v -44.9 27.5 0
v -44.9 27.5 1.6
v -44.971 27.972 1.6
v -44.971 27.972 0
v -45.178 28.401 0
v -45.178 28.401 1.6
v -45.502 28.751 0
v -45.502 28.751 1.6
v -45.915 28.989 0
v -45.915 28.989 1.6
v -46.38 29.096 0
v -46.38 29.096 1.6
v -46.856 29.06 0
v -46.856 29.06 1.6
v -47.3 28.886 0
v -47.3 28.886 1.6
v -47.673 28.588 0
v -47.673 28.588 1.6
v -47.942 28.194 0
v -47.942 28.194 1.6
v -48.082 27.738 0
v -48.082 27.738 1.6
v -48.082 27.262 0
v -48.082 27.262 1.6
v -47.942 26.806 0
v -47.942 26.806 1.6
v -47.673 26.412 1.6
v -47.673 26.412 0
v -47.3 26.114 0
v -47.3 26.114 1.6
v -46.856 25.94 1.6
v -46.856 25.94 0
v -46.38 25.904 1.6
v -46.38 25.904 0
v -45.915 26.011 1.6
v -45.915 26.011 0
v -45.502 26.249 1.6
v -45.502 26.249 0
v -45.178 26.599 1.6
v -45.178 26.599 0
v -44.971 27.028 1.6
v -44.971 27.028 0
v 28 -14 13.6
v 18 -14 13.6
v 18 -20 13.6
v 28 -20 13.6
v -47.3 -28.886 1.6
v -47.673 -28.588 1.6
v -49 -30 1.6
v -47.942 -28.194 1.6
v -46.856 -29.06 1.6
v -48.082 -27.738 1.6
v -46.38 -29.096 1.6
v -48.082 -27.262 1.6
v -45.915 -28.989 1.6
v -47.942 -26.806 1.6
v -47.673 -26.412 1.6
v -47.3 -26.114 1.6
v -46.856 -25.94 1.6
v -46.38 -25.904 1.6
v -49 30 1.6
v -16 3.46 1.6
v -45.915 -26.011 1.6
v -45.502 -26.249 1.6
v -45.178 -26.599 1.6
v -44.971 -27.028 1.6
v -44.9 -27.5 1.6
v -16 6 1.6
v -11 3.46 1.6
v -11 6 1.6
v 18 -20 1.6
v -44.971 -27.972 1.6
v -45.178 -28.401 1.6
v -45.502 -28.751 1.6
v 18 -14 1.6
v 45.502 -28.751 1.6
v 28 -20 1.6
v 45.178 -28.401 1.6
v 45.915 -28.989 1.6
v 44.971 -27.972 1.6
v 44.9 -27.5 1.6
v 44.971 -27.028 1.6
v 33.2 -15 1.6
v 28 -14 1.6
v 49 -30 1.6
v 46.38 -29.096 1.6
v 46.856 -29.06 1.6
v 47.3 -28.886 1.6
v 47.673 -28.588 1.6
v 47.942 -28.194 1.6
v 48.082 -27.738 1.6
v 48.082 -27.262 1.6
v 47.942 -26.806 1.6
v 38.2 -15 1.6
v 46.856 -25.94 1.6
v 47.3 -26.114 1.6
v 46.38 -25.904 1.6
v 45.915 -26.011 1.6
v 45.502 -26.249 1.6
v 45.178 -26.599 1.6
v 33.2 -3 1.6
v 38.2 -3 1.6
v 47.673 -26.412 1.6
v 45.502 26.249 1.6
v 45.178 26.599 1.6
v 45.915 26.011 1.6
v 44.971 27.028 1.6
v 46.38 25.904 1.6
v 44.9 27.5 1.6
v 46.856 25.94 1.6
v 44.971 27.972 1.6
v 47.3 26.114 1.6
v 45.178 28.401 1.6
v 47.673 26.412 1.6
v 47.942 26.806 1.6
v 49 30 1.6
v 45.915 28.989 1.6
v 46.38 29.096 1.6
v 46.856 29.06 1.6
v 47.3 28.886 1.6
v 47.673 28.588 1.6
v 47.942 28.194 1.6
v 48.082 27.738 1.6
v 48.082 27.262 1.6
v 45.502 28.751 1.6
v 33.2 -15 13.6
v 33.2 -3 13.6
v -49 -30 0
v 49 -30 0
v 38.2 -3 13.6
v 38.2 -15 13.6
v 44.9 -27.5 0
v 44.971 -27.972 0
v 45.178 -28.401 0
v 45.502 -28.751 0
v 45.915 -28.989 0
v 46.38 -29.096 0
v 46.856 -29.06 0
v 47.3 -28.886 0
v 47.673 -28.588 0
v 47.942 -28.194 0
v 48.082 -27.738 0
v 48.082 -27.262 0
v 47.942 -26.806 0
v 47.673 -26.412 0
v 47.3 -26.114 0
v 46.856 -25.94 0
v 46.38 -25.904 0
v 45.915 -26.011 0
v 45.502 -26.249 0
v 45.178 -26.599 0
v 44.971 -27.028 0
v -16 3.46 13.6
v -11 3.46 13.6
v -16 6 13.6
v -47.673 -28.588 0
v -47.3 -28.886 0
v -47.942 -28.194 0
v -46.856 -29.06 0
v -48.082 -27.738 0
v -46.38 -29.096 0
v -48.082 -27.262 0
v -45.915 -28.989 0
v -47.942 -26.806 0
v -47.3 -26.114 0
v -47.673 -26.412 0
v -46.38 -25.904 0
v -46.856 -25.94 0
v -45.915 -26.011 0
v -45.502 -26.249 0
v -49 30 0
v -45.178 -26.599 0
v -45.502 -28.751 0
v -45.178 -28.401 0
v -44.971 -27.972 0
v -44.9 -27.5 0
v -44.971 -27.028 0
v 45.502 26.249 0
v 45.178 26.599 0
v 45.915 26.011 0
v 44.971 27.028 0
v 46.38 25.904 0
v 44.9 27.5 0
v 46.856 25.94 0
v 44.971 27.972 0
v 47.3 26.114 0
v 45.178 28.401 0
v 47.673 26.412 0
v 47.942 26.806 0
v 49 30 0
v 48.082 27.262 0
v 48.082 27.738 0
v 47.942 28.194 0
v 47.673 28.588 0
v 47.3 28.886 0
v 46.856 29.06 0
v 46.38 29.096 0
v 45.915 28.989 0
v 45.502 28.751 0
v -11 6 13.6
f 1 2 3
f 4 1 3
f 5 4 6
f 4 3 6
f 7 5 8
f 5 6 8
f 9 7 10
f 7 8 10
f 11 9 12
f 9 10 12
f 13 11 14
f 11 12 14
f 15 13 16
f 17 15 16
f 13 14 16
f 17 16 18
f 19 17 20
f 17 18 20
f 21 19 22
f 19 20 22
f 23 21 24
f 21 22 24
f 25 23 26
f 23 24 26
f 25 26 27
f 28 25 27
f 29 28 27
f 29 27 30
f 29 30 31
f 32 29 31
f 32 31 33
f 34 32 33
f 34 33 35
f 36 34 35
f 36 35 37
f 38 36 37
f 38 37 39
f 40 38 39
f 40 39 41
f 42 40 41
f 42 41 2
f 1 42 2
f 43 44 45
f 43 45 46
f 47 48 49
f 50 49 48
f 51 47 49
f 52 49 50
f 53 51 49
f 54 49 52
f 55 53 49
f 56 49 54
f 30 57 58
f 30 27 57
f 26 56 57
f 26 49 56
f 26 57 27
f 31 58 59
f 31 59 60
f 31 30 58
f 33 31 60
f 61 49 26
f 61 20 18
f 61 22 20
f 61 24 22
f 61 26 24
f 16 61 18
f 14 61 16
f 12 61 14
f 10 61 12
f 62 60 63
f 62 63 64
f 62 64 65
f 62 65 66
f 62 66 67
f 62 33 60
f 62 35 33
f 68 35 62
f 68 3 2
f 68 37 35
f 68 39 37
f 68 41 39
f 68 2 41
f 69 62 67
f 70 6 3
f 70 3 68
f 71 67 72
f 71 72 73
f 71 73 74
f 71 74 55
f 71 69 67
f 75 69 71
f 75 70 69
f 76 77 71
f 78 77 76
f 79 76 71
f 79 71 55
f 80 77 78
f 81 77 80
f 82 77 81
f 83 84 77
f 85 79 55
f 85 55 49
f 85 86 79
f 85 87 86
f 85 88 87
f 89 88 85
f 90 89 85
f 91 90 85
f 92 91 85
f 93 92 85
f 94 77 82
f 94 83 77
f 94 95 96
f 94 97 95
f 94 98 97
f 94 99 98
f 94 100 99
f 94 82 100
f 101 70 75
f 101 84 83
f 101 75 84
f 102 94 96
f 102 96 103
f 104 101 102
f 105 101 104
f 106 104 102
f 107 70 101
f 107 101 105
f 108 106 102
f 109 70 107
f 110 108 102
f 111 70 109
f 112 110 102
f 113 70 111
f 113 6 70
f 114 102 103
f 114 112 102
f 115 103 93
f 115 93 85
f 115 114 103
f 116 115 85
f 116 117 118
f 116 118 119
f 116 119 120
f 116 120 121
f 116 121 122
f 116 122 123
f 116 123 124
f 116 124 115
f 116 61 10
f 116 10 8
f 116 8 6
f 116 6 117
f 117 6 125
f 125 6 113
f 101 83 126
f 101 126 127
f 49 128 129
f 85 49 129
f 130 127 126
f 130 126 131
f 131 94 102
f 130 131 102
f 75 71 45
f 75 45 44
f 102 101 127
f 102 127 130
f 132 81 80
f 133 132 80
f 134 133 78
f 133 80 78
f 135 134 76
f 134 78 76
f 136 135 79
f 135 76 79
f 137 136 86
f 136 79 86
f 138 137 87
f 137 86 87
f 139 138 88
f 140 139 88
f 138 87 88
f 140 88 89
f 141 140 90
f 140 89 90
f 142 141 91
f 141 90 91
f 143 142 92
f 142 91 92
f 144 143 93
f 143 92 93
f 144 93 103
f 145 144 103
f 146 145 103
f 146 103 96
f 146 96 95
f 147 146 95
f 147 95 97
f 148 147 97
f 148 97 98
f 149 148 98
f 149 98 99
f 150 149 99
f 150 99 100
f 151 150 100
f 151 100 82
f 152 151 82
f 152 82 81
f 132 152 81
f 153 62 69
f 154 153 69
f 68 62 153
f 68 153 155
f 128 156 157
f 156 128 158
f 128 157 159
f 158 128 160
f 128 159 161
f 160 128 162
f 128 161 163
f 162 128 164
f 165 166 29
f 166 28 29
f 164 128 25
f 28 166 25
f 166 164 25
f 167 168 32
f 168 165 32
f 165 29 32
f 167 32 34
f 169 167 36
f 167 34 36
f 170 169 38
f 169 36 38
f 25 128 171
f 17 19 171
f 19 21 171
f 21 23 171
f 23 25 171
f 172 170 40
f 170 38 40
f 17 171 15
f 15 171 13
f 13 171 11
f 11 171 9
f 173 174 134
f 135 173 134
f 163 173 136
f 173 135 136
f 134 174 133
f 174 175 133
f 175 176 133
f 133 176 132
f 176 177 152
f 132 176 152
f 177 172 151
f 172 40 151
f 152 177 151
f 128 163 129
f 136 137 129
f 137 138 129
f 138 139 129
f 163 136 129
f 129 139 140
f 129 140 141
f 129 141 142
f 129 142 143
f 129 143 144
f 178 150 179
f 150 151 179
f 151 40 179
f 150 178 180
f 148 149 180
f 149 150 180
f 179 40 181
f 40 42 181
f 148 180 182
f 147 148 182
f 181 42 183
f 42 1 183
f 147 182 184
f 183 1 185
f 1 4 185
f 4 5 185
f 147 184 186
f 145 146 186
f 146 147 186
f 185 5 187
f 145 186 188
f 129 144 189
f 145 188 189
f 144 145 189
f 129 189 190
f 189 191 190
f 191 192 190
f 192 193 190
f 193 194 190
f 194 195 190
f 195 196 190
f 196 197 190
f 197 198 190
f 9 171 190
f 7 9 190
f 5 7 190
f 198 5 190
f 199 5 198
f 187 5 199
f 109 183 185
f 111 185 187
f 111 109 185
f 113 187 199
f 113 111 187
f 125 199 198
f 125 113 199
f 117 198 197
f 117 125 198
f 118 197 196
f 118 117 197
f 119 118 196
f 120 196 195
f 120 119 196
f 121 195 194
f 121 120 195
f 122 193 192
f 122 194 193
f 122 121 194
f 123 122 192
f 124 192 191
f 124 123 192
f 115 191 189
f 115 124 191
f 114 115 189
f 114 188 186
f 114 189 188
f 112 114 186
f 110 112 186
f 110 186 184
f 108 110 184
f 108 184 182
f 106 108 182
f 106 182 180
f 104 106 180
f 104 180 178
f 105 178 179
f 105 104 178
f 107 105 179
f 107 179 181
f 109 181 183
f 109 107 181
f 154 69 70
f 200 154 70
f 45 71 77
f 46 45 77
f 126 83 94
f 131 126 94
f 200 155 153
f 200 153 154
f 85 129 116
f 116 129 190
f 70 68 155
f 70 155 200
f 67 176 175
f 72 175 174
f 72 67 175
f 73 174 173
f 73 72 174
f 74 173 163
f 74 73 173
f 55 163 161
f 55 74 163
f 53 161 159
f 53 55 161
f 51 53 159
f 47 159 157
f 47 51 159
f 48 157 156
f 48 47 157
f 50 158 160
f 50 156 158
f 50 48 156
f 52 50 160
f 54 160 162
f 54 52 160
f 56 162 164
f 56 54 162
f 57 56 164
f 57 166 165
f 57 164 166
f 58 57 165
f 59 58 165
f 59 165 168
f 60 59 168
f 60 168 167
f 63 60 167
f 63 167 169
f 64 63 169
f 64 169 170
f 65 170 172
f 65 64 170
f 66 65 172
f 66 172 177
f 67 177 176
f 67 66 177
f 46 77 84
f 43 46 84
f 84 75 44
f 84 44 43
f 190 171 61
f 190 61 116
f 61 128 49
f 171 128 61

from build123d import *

# Parameters (mm, degrees)
ESQUISSE1_W               = 98
ESQUISSE1_H               = 60
BOSS_EXTRU_1_DEPTH        = 1.6
ESQUISSE2_R               = 1.6
ENL_V_MAT_EXTRU_1_DEPTH   = 58.476603936
SYM_TRIE2_COPY_1_SKETCH_R = 1.6
SYM_TRIE2_COPY_1_DEPTH    = 58.476603936
ESQUISSE3_W               = 5
ESQUISSE3_H               = 12
ESQUISSE3_W_2             = 10
ESQUISSE3_H_2             = 6
ESQUISSE3_H_3             = 2.54
BOSS_EXTRU_2_DEPTH        = 12


with BuildPart() as part:
    # Esquisse1 → Boss.-Extru.1 (new body)
    with BuildSketch(Plane.XY):
        Rectangle(ESQUISSE1_W, ESQUISSE1_H)
    extrude(amount=BOSS_EXTRU_1_DEPTH)

    # Esquisse2 → Enlèv. mat.-Extru.1 (cut, through all)
    with BuildSketch(Plane.XY.offset(1.6)):
        with Locations((-46.5, 27.5)):
            Circle(ESQUISSE2_R)
    enl_v_mat_extru_1 = extrude(amount=-ENL_V_MAT_EXTRU_1_DEPTH, mode=Mode.SUBTRACT)

    # Symétrie1: Enlèv. mat.-Extru.1 across plane
    add(enl_v_mat_extru_1.mirror(Plane.ZX), mode=Mode.SUBTRACT)

    # Symétrie2: Enlèv. mat.-Extru.1 across plane
    add(enl_v_mat_extru_1.mirror(Plane(origin=(0, 0, 0), x_dir=(0, 0, 1), z_dir=(1, 0, 0))), mode=Mode.SUBTRACT)

    # Symétrie2 copy 1 sketch → Symétrie2 copy 1 (cut, through all)
    with BuildSketch(Plane(origin=(0, 0, 1.6), x_dir=(-1, 0, 0), z_dir=(0, 0, 1))):
        with Locations((-46.5, 27.5)):
            Circle(SYM_TRIE2_COPY_1_SKETCH_R)
    extrude(amount=-SYM_TRIE2_COPY_1_DEPTH, mode=Mode.SUBTRACT)

    # Esquisse3 → Boss.-Extru.2 (add)
    with BuildSketch(Plane.XY.offset(1.6)):
        with Locations((35.7, -9)):
            Rectangle(ESQUISSE3_W, ESQUISSE3_H)
        with Locations((23, -17)):
            Rectangle(ESQUISSE3_W_2, ESQUISSE3_H_2)
        with Locations((-13.5, 4.73)):
            Rectangle(ESQUISSE3_W, ESQUISSE3_H_3)
    extrude(amount=BOSS_EXTRU_2_DEPTH)


solid = part.part
